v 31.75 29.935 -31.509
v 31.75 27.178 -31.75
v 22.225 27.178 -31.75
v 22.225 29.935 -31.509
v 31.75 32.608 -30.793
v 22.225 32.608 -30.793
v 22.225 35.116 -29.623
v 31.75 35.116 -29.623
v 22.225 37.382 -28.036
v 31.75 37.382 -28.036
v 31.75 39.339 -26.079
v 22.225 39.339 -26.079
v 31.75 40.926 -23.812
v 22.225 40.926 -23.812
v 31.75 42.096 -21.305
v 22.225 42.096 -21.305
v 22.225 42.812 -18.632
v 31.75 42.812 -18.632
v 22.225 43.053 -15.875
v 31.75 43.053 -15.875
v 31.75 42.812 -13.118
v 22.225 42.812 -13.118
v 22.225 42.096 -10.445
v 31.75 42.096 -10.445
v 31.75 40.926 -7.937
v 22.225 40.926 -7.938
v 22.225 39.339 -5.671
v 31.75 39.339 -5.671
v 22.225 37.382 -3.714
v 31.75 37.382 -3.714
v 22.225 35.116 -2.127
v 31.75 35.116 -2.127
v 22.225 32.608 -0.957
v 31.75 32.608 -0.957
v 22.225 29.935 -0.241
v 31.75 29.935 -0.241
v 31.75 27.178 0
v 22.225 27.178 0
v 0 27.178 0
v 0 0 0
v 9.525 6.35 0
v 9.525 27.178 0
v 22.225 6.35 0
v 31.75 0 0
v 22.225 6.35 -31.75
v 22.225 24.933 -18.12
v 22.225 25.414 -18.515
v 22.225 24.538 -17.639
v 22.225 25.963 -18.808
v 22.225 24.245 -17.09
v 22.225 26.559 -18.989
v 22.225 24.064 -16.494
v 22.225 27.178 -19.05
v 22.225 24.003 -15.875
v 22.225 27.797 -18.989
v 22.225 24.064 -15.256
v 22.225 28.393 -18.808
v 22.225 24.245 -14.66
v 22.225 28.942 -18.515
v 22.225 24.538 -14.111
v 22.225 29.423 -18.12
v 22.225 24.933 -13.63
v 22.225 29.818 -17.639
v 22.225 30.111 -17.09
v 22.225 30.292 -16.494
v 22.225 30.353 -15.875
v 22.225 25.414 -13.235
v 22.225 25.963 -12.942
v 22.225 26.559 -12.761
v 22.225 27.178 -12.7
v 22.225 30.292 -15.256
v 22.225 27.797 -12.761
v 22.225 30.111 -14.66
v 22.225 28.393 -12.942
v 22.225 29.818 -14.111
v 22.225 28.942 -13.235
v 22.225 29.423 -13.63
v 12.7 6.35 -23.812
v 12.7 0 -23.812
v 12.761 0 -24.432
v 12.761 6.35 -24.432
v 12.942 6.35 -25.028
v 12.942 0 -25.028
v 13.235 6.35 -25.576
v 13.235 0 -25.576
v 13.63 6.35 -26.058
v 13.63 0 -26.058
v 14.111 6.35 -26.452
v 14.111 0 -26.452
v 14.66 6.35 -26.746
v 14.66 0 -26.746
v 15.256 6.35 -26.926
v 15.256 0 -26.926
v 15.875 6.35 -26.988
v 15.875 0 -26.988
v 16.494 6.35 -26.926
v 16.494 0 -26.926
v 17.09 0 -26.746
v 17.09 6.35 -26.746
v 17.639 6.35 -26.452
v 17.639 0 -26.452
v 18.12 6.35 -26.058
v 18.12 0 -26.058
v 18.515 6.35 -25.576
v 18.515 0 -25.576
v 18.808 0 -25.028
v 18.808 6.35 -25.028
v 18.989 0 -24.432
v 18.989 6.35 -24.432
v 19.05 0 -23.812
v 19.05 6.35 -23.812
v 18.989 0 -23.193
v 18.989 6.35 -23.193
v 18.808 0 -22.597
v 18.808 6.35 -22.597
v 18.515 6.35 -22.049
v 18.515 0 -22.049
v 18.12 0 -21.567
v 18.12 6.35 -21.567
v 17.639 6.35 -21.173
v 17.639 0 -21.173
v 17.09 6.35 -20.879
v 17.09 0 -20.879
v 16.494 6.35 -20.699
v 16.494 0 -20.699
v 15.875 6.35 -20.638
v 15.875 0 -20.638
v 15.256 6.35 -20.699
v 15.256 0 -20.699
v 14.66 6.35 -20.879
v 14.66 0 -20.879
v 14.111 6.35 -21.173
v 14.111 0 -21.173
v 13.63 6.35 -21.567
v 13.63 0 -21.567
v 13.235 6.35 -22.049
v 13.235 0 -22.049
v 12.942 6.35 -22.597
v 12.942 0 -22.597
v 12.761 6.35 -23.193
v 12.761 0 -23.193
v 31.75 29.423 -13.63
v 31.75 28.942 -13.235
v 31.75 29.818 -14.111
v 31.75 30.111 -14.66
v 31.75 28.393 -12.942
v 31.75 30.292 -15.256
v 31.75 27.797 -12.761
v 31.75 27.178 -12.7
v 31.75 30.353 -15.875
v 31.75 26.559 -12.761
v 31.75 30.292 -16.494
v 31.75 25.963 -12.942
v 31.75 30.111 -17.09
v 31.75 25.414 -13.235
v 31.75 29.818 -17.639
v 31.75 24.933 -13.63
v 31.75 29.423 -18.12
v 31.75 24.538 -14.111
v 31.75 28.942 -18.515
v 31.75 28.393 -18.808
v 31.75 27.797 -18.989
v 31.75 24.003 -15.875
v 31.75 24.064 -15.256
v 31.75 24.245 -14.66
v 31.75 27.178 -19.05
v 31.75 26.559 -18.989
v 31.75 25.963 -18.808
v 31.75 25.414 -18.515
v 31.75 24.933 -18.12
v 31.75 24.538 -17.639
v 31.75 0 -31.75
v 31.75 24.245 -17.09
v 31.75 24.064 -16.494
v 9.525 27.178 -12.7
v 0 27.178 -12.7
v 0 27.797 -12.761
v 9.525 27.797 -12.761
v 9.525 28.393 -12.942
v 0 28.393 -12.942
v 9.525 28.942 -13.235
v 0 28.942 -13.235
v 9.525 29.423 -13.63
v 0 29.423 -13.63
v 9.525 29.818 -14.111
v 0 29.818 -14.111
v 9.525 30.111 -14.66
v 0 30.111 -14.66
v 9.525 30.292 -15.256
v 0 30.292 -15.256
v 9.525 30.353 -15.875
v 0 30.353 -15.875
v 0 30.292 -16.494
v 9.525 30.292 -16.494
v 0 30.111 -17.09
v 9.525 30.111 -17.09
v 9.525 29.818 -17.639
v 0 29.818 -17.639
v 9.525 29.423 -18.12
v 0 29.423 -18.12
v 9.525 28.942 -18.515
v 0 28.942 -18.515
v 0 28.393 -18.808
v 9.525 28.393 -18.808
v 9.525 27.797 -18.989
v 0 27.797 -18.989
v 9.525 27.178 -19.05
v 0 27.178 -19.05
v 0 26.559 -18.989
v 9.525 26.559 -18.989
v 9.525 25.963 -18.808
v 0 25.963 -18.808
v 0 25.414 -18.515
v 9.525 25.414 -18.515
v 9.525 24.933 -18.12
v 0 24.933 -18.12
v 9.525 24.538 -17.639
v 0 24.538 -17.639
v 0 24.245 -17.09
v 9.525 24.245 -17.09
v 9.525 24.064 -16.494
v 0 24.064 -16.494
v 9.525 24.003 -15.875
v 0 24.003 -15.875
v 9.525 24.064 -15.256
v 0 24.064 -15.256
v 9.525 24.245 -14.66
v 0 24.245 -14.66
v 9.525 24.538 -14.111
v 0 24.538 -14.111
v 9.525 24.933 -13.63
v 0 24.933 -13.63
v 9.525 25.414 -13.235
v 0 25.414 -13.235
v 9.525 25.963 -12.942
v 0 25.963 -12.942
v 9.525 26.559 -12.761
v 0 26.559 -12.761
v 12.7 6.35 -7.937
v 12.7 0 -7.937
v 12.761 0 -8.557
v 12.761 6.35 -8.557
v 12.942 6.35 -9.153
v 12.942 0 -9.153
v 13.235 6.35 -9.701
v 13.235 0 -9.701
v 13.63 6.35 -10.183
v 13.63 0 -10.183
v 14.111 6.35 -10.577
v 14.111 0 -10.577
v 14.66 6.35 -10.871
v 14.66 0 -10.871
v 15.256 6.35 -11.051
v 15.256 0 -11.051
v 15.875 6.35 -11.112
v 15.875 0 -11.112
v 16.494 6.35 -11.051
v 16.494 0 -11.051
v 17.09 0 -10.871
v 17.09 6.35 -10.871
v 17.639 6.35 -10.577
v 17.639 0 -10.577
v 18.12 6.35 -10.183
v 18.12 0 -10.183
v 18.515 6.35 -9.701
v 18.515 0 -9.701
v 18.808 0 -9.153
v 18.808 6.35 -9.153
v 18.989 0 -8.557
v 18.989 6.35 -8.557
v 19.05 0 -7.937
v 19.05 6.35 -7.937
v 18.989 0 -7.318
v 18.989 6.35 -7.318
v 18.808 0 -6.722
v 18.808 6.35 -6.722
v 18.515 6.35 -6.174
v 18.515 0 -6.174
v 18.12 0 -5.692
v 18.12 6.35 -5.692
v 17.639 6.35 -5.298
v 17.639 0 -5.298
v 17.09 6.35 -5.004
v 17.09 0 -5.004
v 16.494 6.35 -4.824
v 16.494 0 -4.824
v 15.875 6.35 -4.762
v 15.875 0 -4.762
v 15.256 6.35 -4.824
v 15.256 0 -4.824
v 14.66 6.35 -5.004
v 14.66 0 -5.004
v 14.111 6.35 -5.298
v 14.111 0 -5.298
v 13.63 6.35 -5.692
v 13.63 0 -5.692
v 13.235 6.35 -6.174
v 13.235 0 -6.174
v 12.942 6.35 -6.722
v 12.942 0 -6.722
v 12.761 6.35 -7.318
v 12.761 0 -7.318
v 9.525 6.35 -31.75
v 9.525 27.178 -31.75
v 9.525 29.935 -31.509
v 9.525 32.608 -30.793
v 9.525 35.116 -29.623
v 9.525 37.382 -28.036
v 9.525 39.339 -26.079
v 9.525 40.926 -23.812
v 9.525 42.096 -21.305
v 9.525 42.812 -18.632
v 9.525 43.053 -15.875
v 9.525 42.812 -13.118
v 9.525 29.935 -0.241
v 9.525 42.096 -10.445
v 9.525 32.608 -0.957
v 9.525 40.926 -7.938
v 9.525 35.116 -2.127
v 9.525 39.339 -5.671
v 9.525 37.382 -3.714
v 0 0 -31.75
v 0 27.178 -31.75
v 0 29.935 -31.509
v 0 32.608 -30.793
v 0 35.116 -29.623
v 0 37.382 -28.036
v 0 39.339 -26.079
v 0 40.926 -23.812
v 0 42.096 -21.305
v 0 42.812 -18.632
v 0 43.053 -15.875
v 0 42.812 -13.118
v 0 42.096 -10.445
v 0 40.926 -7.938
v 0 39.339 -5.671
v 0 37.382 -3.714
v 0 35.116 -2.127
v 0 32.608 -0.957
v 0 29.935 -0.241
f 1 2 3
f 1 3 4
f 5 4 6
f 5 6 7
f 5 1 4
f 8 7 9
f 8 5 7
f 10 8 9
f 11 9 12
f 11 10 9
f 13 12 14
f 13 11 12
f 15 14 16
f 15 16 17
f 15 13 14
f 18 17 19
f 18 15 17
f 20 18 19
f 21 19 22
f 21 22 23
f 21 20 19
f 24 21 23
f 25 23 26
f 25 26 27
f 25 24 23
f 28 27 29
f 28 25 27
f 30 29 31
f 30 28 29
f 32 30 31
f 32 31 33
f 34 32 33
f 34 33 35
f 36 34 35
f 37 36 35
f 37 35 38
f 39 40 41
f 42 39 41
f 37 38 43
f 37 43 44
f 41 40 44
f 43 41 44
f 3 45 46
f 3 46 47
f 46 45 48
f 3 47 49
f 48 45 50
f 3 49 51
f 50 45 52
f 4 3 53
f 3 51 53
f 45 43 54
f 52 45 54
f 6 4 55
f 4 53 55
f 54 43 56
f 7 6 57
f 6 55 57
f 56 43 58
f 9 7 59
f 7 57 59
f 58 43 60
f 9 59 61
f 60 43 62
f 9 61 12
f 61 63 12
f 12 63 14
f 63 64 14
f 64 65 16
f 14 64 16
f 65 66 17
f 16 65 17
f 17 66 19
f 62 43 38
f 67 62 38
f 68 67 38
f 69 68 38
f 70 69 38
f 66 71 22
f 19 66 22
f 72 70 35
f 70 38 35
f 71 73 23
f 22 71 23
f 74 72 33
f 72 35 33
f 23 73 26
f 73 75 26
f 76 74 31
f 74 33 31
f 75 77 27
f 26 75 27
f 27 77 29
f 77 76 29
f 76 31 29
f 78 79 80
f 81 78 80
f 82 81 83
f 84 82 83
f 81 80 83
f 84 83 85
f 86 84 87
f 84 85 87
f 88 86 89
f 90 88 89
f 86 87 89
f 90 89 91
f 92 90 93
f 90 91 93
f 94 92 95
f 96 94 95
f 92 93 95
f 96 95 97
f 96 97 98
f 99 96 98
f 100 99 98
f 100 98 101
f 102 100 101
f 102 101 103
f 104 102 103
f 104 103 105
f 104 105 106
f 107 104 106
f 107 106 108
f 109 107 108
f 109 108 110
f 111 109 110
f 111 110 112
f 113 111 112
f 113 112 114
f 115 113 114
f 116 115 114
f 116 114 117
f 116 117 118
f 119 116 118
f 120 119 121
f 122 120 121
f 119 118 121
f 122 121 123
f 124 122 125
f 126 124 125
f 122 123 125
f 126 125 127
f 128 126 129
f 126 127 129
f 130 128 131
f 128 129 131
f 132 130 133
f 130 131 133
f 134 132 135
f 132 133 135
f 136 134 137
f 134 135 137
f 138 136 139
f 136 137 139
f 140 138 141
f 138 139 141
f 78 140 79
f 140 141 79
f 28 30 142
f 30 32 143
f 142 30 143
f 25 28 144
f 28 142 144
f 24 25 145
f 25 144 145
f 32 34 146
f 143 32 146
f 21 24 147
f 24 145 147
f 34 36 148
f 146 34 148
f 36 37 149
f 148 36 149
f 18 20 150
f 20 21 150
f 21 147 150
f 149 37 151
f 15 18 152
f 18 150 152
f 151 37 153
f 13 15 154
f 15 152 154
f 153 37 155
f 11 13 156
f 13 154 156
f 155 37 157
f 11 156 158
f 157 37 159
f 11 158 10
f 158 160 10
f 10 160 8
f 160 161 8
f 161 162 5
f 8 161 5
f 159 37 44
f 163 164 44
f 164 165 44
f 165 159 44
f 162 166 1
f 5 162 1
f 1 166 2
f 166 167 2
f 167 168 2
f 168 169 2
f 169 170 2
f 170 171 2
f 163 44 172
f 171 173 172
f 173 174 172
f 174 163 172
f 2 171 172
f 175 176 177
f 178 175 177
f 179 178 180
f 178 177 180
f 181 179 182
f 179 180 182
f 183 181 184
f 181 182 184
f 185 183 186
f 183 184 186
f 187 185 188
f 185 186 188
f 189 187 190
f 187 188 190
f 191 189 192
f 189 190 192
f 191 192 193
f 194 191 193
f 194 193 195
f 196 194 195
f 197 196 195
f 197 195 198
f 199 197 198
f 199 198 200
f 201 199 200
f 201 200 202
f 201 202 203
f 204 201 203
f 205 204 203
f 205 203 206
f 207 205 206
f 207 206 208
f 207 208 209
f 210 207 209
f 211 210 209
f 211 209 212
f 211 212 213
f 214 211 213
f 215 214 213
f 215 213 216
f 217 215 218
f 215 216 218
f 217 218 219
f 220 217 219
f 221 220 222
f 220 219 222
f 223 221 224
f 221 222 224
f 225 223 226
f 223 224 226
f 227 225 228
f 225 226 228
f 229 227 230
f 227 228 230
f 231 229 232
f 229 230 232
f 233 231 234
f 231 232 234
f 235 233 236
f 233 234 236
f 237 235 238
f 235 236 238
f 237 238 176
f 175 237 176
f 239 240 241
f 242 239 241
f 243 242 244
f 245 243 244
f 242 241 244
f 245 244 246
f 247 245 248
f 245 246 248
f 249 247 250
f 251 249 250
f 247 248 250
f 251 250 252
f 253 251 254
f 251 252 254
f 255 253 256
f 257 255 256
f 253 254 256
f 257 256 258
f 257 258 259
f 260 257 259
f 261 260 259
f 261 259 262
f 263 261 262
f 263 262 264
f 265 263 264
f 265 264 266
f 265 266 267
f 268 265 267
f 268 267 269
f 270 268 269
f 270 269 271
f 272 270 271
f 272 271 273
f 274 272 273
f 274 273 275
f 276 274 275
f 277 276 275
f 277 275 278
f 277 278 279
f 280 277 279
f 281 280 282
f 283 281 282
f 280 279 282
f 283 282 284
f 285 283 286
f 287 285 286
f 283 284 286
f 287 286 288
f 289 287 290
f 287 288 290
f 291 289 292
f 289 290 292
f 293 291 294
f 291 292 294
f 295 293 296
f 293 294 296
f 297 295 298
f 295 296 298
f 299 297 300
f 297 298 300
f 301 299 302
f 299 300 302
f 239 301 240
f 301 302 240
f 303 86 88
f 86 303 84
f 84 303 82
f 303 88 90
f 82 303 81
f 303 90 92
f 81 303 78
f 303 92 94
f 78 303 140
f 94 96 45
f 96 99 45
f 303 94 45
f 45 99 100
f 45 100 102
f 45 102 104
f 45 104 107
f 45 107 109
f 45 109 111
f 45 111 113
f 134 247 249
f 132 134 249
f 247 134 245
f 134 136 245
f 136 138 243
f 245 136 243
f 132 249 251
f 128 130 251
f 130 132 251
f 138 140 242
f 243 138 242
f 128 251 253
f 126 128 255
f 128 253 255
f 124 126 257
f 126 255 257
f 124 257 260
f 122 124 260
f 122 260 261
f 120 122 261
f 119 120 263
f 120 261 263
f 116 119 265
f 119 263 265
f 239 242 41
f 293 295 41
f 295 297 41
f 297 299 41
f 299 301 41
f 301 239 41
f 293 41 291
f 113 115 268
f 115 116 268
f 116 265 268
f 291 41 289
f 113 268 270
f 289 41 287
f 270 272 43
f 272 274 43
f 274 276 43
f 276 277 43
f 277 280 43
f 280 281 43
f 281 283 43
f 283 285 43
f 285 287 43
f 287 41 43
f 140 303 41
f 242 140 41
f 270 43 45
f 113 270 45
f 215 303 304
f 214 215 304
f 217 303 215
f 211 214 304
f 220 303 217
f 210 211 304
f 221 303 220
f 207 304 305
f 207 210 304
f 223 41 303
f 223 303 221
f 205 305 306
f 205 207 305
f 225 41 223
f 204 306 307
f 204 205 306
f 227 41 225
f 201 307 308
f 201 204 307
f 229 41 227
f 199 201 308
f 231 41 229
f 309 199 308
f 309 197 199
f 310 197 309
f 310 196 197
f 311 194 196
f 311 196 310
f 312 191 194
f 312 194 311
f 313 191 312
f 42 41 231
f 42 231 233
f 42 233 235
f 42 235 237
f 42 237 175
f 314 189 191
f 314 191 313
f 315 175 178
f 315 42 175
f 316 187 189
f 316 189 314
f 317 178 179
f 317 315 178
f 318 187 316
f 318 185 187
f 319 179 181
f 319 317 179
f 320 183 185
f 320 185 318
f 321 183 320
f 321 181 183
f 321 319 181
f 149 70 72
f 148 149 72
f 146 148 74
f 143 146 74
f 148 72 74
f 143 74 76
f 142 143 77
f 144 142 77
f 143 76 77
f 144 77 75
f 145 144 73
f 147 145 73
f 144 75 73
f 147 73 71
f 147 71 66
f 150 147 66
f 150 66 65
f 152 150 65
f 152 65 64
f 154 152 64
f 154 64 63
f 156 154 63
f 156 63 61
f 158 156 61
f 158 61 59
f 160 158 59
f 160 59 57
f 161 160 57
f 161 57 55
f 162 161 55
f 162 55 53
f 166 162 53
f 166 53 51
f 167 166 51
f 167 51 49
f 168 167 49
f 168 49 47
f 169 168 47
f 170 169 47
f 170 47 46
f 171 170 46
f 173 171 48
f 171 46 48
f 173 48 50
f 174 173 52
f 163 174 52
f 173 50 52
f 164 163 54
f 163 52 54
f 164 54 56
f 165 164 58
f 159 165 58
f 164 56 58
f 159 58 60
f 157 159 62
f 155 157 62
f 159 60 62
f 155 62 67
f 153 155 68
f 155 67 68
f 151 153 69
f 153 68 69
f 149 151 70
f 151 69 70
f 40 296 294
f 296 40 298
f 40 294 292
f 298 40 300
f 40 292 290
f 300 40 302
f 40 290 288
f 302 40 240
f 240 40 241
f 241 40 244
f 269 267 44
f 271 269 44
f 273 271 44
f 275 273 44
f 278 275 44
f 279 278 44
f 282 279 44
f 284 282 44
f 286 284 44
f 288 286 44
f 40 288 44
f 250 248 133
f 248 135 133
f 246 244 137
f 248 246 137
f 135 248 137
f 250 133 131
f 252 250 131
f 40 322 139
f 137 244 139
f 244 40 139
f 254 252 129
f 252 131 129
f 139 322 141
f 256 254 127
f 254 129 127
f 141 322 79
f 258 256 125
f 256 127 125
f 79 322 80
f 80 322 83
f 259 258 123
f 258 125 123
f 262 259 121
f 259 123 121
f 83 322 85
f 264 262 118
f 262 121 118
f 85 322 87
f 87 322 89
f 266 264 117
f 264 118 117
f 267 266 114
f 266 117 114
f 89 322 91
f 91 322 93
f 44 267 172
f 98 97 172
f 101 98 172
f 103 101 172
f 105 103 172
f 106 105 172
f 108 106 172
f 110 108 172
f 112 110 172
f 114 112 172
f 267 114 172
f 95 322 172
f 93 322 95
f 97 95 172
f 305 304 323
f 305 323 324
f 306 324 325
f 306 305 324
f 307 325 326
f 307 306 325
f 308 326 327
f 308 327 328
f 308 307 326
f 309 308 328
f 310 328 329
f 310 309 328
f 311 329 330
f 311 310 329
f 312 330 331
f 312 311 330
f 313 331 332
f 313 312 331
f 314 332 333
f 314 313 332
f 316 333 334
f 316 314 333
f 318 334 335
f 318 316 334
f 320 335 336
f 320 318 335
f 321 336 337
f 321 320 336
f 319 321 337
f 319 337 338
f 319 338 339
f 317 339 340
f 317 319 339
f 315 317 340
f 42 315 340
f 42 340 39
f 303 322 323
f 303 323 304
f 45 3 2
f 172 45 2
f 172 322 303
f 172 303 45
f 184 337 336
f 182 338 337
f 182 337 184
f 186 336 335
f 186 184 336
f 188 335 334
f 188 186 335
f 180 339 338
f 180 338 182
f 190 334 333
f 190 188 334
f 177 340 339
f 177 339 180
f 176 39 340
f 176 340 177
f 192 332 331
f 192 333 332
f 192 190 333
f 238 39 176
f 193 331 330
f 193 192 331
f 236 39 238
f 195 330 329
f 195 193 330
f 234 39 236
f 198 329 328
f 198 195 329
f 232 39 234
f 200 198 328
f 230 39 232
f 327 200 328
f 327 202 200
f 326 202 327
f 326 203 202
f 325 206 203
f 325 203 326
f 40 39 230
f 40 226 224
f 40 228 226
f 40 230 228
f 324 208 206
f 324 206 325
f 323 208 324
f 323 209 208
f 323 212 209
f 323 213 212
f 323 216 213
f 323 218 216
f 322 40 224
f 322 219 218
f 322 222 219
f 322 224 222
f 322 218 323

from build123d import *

# Parameters (mm, degrees)
SKETCH1_W              = 31.75
SKETCH1_H              = 31.75
BOSS_EXTRUDE1_DEPTH    = 50.8
CUT_EXTRUDE1_DEPTH     = 68.7994469
SKETCH3_W              = 12.7
SKETCH3_H              = 50.8
CUT_EXTRUDE2_DEPTH     = 63.206798736
F_1_1_DIAMETER_HOLE1_D = 6.35
F_1_1_DIAMETER_HOLE2_D = 6.35


with BuildPart() as part:
    # Sketch1 → Boss-Extrude1 (new body)
    with BuildSketch(Plane(origin=(0, 0, 0), x_dir=(1, 0, 0), z_dir=(0, 1, 0))):
        with Locations((15.875, 15.875)):
            Rectangle(SKETCH1_W, SKETCH1_H)
    extrude(amount=BOSS_EXTRUDE1_DEPTH)

    # Sketch2 → Cut-Extrude1 (cut, through all)
    with BuildSketch(Plane(origin=(31.75, 0, 0), x_dir=(0, 0, -1), z_dir=(1, 0, 0))):
        with BuildLine():
            Line((0, 50.8), (31.75, 50.8))
            Line((31.75, 50.8), (31.75, 27.178))
            ThreePointArc((31.75, 27.178), (15.875, 43.053), (0, 27.178))
            Line((0, 27.178), (0, 50.8))
        make_face()
    extrude(amount=-CUT_EXTRUDE1_DEPTH, mode=Mode.SUBTRACT)

    # Sketch3 → Cut-Extrude2 (cut, through all)
    with BuildSketch(Plane.XY):
        with Locations((15.875, 31.75)):
            Rectangle(SKETCH3_W, SKETCH3_H)
    extrude(amount=-CUT_EXTRUDE2_DEPTH, mode=Mode.SUBTRACT)

    # 1 (1) Diameter Hole1 (through all)
    with Locations(Plane(origin=(0, 6.35, 0), x_dir=(1, 0, 0), z_dir=(0, 1, 0))):
        with Locations((15.875, 23.8125), (15.875, 7.9375)):
            Hole(F_1_1_DIAMETER_HOLE1_D / 2)

    # 1 (1) Diameter Hole2 (through all)
    with Locations(Plane(origin=(31.75, 0, 0), x_dir=(0, 0, -1), z_dir=(1, 0, 0))):
        with Locations((15.875, 27.178)):
            Hole(F_1_1_DIAMETER_HOLE2_D / 2)


solid = part.part
